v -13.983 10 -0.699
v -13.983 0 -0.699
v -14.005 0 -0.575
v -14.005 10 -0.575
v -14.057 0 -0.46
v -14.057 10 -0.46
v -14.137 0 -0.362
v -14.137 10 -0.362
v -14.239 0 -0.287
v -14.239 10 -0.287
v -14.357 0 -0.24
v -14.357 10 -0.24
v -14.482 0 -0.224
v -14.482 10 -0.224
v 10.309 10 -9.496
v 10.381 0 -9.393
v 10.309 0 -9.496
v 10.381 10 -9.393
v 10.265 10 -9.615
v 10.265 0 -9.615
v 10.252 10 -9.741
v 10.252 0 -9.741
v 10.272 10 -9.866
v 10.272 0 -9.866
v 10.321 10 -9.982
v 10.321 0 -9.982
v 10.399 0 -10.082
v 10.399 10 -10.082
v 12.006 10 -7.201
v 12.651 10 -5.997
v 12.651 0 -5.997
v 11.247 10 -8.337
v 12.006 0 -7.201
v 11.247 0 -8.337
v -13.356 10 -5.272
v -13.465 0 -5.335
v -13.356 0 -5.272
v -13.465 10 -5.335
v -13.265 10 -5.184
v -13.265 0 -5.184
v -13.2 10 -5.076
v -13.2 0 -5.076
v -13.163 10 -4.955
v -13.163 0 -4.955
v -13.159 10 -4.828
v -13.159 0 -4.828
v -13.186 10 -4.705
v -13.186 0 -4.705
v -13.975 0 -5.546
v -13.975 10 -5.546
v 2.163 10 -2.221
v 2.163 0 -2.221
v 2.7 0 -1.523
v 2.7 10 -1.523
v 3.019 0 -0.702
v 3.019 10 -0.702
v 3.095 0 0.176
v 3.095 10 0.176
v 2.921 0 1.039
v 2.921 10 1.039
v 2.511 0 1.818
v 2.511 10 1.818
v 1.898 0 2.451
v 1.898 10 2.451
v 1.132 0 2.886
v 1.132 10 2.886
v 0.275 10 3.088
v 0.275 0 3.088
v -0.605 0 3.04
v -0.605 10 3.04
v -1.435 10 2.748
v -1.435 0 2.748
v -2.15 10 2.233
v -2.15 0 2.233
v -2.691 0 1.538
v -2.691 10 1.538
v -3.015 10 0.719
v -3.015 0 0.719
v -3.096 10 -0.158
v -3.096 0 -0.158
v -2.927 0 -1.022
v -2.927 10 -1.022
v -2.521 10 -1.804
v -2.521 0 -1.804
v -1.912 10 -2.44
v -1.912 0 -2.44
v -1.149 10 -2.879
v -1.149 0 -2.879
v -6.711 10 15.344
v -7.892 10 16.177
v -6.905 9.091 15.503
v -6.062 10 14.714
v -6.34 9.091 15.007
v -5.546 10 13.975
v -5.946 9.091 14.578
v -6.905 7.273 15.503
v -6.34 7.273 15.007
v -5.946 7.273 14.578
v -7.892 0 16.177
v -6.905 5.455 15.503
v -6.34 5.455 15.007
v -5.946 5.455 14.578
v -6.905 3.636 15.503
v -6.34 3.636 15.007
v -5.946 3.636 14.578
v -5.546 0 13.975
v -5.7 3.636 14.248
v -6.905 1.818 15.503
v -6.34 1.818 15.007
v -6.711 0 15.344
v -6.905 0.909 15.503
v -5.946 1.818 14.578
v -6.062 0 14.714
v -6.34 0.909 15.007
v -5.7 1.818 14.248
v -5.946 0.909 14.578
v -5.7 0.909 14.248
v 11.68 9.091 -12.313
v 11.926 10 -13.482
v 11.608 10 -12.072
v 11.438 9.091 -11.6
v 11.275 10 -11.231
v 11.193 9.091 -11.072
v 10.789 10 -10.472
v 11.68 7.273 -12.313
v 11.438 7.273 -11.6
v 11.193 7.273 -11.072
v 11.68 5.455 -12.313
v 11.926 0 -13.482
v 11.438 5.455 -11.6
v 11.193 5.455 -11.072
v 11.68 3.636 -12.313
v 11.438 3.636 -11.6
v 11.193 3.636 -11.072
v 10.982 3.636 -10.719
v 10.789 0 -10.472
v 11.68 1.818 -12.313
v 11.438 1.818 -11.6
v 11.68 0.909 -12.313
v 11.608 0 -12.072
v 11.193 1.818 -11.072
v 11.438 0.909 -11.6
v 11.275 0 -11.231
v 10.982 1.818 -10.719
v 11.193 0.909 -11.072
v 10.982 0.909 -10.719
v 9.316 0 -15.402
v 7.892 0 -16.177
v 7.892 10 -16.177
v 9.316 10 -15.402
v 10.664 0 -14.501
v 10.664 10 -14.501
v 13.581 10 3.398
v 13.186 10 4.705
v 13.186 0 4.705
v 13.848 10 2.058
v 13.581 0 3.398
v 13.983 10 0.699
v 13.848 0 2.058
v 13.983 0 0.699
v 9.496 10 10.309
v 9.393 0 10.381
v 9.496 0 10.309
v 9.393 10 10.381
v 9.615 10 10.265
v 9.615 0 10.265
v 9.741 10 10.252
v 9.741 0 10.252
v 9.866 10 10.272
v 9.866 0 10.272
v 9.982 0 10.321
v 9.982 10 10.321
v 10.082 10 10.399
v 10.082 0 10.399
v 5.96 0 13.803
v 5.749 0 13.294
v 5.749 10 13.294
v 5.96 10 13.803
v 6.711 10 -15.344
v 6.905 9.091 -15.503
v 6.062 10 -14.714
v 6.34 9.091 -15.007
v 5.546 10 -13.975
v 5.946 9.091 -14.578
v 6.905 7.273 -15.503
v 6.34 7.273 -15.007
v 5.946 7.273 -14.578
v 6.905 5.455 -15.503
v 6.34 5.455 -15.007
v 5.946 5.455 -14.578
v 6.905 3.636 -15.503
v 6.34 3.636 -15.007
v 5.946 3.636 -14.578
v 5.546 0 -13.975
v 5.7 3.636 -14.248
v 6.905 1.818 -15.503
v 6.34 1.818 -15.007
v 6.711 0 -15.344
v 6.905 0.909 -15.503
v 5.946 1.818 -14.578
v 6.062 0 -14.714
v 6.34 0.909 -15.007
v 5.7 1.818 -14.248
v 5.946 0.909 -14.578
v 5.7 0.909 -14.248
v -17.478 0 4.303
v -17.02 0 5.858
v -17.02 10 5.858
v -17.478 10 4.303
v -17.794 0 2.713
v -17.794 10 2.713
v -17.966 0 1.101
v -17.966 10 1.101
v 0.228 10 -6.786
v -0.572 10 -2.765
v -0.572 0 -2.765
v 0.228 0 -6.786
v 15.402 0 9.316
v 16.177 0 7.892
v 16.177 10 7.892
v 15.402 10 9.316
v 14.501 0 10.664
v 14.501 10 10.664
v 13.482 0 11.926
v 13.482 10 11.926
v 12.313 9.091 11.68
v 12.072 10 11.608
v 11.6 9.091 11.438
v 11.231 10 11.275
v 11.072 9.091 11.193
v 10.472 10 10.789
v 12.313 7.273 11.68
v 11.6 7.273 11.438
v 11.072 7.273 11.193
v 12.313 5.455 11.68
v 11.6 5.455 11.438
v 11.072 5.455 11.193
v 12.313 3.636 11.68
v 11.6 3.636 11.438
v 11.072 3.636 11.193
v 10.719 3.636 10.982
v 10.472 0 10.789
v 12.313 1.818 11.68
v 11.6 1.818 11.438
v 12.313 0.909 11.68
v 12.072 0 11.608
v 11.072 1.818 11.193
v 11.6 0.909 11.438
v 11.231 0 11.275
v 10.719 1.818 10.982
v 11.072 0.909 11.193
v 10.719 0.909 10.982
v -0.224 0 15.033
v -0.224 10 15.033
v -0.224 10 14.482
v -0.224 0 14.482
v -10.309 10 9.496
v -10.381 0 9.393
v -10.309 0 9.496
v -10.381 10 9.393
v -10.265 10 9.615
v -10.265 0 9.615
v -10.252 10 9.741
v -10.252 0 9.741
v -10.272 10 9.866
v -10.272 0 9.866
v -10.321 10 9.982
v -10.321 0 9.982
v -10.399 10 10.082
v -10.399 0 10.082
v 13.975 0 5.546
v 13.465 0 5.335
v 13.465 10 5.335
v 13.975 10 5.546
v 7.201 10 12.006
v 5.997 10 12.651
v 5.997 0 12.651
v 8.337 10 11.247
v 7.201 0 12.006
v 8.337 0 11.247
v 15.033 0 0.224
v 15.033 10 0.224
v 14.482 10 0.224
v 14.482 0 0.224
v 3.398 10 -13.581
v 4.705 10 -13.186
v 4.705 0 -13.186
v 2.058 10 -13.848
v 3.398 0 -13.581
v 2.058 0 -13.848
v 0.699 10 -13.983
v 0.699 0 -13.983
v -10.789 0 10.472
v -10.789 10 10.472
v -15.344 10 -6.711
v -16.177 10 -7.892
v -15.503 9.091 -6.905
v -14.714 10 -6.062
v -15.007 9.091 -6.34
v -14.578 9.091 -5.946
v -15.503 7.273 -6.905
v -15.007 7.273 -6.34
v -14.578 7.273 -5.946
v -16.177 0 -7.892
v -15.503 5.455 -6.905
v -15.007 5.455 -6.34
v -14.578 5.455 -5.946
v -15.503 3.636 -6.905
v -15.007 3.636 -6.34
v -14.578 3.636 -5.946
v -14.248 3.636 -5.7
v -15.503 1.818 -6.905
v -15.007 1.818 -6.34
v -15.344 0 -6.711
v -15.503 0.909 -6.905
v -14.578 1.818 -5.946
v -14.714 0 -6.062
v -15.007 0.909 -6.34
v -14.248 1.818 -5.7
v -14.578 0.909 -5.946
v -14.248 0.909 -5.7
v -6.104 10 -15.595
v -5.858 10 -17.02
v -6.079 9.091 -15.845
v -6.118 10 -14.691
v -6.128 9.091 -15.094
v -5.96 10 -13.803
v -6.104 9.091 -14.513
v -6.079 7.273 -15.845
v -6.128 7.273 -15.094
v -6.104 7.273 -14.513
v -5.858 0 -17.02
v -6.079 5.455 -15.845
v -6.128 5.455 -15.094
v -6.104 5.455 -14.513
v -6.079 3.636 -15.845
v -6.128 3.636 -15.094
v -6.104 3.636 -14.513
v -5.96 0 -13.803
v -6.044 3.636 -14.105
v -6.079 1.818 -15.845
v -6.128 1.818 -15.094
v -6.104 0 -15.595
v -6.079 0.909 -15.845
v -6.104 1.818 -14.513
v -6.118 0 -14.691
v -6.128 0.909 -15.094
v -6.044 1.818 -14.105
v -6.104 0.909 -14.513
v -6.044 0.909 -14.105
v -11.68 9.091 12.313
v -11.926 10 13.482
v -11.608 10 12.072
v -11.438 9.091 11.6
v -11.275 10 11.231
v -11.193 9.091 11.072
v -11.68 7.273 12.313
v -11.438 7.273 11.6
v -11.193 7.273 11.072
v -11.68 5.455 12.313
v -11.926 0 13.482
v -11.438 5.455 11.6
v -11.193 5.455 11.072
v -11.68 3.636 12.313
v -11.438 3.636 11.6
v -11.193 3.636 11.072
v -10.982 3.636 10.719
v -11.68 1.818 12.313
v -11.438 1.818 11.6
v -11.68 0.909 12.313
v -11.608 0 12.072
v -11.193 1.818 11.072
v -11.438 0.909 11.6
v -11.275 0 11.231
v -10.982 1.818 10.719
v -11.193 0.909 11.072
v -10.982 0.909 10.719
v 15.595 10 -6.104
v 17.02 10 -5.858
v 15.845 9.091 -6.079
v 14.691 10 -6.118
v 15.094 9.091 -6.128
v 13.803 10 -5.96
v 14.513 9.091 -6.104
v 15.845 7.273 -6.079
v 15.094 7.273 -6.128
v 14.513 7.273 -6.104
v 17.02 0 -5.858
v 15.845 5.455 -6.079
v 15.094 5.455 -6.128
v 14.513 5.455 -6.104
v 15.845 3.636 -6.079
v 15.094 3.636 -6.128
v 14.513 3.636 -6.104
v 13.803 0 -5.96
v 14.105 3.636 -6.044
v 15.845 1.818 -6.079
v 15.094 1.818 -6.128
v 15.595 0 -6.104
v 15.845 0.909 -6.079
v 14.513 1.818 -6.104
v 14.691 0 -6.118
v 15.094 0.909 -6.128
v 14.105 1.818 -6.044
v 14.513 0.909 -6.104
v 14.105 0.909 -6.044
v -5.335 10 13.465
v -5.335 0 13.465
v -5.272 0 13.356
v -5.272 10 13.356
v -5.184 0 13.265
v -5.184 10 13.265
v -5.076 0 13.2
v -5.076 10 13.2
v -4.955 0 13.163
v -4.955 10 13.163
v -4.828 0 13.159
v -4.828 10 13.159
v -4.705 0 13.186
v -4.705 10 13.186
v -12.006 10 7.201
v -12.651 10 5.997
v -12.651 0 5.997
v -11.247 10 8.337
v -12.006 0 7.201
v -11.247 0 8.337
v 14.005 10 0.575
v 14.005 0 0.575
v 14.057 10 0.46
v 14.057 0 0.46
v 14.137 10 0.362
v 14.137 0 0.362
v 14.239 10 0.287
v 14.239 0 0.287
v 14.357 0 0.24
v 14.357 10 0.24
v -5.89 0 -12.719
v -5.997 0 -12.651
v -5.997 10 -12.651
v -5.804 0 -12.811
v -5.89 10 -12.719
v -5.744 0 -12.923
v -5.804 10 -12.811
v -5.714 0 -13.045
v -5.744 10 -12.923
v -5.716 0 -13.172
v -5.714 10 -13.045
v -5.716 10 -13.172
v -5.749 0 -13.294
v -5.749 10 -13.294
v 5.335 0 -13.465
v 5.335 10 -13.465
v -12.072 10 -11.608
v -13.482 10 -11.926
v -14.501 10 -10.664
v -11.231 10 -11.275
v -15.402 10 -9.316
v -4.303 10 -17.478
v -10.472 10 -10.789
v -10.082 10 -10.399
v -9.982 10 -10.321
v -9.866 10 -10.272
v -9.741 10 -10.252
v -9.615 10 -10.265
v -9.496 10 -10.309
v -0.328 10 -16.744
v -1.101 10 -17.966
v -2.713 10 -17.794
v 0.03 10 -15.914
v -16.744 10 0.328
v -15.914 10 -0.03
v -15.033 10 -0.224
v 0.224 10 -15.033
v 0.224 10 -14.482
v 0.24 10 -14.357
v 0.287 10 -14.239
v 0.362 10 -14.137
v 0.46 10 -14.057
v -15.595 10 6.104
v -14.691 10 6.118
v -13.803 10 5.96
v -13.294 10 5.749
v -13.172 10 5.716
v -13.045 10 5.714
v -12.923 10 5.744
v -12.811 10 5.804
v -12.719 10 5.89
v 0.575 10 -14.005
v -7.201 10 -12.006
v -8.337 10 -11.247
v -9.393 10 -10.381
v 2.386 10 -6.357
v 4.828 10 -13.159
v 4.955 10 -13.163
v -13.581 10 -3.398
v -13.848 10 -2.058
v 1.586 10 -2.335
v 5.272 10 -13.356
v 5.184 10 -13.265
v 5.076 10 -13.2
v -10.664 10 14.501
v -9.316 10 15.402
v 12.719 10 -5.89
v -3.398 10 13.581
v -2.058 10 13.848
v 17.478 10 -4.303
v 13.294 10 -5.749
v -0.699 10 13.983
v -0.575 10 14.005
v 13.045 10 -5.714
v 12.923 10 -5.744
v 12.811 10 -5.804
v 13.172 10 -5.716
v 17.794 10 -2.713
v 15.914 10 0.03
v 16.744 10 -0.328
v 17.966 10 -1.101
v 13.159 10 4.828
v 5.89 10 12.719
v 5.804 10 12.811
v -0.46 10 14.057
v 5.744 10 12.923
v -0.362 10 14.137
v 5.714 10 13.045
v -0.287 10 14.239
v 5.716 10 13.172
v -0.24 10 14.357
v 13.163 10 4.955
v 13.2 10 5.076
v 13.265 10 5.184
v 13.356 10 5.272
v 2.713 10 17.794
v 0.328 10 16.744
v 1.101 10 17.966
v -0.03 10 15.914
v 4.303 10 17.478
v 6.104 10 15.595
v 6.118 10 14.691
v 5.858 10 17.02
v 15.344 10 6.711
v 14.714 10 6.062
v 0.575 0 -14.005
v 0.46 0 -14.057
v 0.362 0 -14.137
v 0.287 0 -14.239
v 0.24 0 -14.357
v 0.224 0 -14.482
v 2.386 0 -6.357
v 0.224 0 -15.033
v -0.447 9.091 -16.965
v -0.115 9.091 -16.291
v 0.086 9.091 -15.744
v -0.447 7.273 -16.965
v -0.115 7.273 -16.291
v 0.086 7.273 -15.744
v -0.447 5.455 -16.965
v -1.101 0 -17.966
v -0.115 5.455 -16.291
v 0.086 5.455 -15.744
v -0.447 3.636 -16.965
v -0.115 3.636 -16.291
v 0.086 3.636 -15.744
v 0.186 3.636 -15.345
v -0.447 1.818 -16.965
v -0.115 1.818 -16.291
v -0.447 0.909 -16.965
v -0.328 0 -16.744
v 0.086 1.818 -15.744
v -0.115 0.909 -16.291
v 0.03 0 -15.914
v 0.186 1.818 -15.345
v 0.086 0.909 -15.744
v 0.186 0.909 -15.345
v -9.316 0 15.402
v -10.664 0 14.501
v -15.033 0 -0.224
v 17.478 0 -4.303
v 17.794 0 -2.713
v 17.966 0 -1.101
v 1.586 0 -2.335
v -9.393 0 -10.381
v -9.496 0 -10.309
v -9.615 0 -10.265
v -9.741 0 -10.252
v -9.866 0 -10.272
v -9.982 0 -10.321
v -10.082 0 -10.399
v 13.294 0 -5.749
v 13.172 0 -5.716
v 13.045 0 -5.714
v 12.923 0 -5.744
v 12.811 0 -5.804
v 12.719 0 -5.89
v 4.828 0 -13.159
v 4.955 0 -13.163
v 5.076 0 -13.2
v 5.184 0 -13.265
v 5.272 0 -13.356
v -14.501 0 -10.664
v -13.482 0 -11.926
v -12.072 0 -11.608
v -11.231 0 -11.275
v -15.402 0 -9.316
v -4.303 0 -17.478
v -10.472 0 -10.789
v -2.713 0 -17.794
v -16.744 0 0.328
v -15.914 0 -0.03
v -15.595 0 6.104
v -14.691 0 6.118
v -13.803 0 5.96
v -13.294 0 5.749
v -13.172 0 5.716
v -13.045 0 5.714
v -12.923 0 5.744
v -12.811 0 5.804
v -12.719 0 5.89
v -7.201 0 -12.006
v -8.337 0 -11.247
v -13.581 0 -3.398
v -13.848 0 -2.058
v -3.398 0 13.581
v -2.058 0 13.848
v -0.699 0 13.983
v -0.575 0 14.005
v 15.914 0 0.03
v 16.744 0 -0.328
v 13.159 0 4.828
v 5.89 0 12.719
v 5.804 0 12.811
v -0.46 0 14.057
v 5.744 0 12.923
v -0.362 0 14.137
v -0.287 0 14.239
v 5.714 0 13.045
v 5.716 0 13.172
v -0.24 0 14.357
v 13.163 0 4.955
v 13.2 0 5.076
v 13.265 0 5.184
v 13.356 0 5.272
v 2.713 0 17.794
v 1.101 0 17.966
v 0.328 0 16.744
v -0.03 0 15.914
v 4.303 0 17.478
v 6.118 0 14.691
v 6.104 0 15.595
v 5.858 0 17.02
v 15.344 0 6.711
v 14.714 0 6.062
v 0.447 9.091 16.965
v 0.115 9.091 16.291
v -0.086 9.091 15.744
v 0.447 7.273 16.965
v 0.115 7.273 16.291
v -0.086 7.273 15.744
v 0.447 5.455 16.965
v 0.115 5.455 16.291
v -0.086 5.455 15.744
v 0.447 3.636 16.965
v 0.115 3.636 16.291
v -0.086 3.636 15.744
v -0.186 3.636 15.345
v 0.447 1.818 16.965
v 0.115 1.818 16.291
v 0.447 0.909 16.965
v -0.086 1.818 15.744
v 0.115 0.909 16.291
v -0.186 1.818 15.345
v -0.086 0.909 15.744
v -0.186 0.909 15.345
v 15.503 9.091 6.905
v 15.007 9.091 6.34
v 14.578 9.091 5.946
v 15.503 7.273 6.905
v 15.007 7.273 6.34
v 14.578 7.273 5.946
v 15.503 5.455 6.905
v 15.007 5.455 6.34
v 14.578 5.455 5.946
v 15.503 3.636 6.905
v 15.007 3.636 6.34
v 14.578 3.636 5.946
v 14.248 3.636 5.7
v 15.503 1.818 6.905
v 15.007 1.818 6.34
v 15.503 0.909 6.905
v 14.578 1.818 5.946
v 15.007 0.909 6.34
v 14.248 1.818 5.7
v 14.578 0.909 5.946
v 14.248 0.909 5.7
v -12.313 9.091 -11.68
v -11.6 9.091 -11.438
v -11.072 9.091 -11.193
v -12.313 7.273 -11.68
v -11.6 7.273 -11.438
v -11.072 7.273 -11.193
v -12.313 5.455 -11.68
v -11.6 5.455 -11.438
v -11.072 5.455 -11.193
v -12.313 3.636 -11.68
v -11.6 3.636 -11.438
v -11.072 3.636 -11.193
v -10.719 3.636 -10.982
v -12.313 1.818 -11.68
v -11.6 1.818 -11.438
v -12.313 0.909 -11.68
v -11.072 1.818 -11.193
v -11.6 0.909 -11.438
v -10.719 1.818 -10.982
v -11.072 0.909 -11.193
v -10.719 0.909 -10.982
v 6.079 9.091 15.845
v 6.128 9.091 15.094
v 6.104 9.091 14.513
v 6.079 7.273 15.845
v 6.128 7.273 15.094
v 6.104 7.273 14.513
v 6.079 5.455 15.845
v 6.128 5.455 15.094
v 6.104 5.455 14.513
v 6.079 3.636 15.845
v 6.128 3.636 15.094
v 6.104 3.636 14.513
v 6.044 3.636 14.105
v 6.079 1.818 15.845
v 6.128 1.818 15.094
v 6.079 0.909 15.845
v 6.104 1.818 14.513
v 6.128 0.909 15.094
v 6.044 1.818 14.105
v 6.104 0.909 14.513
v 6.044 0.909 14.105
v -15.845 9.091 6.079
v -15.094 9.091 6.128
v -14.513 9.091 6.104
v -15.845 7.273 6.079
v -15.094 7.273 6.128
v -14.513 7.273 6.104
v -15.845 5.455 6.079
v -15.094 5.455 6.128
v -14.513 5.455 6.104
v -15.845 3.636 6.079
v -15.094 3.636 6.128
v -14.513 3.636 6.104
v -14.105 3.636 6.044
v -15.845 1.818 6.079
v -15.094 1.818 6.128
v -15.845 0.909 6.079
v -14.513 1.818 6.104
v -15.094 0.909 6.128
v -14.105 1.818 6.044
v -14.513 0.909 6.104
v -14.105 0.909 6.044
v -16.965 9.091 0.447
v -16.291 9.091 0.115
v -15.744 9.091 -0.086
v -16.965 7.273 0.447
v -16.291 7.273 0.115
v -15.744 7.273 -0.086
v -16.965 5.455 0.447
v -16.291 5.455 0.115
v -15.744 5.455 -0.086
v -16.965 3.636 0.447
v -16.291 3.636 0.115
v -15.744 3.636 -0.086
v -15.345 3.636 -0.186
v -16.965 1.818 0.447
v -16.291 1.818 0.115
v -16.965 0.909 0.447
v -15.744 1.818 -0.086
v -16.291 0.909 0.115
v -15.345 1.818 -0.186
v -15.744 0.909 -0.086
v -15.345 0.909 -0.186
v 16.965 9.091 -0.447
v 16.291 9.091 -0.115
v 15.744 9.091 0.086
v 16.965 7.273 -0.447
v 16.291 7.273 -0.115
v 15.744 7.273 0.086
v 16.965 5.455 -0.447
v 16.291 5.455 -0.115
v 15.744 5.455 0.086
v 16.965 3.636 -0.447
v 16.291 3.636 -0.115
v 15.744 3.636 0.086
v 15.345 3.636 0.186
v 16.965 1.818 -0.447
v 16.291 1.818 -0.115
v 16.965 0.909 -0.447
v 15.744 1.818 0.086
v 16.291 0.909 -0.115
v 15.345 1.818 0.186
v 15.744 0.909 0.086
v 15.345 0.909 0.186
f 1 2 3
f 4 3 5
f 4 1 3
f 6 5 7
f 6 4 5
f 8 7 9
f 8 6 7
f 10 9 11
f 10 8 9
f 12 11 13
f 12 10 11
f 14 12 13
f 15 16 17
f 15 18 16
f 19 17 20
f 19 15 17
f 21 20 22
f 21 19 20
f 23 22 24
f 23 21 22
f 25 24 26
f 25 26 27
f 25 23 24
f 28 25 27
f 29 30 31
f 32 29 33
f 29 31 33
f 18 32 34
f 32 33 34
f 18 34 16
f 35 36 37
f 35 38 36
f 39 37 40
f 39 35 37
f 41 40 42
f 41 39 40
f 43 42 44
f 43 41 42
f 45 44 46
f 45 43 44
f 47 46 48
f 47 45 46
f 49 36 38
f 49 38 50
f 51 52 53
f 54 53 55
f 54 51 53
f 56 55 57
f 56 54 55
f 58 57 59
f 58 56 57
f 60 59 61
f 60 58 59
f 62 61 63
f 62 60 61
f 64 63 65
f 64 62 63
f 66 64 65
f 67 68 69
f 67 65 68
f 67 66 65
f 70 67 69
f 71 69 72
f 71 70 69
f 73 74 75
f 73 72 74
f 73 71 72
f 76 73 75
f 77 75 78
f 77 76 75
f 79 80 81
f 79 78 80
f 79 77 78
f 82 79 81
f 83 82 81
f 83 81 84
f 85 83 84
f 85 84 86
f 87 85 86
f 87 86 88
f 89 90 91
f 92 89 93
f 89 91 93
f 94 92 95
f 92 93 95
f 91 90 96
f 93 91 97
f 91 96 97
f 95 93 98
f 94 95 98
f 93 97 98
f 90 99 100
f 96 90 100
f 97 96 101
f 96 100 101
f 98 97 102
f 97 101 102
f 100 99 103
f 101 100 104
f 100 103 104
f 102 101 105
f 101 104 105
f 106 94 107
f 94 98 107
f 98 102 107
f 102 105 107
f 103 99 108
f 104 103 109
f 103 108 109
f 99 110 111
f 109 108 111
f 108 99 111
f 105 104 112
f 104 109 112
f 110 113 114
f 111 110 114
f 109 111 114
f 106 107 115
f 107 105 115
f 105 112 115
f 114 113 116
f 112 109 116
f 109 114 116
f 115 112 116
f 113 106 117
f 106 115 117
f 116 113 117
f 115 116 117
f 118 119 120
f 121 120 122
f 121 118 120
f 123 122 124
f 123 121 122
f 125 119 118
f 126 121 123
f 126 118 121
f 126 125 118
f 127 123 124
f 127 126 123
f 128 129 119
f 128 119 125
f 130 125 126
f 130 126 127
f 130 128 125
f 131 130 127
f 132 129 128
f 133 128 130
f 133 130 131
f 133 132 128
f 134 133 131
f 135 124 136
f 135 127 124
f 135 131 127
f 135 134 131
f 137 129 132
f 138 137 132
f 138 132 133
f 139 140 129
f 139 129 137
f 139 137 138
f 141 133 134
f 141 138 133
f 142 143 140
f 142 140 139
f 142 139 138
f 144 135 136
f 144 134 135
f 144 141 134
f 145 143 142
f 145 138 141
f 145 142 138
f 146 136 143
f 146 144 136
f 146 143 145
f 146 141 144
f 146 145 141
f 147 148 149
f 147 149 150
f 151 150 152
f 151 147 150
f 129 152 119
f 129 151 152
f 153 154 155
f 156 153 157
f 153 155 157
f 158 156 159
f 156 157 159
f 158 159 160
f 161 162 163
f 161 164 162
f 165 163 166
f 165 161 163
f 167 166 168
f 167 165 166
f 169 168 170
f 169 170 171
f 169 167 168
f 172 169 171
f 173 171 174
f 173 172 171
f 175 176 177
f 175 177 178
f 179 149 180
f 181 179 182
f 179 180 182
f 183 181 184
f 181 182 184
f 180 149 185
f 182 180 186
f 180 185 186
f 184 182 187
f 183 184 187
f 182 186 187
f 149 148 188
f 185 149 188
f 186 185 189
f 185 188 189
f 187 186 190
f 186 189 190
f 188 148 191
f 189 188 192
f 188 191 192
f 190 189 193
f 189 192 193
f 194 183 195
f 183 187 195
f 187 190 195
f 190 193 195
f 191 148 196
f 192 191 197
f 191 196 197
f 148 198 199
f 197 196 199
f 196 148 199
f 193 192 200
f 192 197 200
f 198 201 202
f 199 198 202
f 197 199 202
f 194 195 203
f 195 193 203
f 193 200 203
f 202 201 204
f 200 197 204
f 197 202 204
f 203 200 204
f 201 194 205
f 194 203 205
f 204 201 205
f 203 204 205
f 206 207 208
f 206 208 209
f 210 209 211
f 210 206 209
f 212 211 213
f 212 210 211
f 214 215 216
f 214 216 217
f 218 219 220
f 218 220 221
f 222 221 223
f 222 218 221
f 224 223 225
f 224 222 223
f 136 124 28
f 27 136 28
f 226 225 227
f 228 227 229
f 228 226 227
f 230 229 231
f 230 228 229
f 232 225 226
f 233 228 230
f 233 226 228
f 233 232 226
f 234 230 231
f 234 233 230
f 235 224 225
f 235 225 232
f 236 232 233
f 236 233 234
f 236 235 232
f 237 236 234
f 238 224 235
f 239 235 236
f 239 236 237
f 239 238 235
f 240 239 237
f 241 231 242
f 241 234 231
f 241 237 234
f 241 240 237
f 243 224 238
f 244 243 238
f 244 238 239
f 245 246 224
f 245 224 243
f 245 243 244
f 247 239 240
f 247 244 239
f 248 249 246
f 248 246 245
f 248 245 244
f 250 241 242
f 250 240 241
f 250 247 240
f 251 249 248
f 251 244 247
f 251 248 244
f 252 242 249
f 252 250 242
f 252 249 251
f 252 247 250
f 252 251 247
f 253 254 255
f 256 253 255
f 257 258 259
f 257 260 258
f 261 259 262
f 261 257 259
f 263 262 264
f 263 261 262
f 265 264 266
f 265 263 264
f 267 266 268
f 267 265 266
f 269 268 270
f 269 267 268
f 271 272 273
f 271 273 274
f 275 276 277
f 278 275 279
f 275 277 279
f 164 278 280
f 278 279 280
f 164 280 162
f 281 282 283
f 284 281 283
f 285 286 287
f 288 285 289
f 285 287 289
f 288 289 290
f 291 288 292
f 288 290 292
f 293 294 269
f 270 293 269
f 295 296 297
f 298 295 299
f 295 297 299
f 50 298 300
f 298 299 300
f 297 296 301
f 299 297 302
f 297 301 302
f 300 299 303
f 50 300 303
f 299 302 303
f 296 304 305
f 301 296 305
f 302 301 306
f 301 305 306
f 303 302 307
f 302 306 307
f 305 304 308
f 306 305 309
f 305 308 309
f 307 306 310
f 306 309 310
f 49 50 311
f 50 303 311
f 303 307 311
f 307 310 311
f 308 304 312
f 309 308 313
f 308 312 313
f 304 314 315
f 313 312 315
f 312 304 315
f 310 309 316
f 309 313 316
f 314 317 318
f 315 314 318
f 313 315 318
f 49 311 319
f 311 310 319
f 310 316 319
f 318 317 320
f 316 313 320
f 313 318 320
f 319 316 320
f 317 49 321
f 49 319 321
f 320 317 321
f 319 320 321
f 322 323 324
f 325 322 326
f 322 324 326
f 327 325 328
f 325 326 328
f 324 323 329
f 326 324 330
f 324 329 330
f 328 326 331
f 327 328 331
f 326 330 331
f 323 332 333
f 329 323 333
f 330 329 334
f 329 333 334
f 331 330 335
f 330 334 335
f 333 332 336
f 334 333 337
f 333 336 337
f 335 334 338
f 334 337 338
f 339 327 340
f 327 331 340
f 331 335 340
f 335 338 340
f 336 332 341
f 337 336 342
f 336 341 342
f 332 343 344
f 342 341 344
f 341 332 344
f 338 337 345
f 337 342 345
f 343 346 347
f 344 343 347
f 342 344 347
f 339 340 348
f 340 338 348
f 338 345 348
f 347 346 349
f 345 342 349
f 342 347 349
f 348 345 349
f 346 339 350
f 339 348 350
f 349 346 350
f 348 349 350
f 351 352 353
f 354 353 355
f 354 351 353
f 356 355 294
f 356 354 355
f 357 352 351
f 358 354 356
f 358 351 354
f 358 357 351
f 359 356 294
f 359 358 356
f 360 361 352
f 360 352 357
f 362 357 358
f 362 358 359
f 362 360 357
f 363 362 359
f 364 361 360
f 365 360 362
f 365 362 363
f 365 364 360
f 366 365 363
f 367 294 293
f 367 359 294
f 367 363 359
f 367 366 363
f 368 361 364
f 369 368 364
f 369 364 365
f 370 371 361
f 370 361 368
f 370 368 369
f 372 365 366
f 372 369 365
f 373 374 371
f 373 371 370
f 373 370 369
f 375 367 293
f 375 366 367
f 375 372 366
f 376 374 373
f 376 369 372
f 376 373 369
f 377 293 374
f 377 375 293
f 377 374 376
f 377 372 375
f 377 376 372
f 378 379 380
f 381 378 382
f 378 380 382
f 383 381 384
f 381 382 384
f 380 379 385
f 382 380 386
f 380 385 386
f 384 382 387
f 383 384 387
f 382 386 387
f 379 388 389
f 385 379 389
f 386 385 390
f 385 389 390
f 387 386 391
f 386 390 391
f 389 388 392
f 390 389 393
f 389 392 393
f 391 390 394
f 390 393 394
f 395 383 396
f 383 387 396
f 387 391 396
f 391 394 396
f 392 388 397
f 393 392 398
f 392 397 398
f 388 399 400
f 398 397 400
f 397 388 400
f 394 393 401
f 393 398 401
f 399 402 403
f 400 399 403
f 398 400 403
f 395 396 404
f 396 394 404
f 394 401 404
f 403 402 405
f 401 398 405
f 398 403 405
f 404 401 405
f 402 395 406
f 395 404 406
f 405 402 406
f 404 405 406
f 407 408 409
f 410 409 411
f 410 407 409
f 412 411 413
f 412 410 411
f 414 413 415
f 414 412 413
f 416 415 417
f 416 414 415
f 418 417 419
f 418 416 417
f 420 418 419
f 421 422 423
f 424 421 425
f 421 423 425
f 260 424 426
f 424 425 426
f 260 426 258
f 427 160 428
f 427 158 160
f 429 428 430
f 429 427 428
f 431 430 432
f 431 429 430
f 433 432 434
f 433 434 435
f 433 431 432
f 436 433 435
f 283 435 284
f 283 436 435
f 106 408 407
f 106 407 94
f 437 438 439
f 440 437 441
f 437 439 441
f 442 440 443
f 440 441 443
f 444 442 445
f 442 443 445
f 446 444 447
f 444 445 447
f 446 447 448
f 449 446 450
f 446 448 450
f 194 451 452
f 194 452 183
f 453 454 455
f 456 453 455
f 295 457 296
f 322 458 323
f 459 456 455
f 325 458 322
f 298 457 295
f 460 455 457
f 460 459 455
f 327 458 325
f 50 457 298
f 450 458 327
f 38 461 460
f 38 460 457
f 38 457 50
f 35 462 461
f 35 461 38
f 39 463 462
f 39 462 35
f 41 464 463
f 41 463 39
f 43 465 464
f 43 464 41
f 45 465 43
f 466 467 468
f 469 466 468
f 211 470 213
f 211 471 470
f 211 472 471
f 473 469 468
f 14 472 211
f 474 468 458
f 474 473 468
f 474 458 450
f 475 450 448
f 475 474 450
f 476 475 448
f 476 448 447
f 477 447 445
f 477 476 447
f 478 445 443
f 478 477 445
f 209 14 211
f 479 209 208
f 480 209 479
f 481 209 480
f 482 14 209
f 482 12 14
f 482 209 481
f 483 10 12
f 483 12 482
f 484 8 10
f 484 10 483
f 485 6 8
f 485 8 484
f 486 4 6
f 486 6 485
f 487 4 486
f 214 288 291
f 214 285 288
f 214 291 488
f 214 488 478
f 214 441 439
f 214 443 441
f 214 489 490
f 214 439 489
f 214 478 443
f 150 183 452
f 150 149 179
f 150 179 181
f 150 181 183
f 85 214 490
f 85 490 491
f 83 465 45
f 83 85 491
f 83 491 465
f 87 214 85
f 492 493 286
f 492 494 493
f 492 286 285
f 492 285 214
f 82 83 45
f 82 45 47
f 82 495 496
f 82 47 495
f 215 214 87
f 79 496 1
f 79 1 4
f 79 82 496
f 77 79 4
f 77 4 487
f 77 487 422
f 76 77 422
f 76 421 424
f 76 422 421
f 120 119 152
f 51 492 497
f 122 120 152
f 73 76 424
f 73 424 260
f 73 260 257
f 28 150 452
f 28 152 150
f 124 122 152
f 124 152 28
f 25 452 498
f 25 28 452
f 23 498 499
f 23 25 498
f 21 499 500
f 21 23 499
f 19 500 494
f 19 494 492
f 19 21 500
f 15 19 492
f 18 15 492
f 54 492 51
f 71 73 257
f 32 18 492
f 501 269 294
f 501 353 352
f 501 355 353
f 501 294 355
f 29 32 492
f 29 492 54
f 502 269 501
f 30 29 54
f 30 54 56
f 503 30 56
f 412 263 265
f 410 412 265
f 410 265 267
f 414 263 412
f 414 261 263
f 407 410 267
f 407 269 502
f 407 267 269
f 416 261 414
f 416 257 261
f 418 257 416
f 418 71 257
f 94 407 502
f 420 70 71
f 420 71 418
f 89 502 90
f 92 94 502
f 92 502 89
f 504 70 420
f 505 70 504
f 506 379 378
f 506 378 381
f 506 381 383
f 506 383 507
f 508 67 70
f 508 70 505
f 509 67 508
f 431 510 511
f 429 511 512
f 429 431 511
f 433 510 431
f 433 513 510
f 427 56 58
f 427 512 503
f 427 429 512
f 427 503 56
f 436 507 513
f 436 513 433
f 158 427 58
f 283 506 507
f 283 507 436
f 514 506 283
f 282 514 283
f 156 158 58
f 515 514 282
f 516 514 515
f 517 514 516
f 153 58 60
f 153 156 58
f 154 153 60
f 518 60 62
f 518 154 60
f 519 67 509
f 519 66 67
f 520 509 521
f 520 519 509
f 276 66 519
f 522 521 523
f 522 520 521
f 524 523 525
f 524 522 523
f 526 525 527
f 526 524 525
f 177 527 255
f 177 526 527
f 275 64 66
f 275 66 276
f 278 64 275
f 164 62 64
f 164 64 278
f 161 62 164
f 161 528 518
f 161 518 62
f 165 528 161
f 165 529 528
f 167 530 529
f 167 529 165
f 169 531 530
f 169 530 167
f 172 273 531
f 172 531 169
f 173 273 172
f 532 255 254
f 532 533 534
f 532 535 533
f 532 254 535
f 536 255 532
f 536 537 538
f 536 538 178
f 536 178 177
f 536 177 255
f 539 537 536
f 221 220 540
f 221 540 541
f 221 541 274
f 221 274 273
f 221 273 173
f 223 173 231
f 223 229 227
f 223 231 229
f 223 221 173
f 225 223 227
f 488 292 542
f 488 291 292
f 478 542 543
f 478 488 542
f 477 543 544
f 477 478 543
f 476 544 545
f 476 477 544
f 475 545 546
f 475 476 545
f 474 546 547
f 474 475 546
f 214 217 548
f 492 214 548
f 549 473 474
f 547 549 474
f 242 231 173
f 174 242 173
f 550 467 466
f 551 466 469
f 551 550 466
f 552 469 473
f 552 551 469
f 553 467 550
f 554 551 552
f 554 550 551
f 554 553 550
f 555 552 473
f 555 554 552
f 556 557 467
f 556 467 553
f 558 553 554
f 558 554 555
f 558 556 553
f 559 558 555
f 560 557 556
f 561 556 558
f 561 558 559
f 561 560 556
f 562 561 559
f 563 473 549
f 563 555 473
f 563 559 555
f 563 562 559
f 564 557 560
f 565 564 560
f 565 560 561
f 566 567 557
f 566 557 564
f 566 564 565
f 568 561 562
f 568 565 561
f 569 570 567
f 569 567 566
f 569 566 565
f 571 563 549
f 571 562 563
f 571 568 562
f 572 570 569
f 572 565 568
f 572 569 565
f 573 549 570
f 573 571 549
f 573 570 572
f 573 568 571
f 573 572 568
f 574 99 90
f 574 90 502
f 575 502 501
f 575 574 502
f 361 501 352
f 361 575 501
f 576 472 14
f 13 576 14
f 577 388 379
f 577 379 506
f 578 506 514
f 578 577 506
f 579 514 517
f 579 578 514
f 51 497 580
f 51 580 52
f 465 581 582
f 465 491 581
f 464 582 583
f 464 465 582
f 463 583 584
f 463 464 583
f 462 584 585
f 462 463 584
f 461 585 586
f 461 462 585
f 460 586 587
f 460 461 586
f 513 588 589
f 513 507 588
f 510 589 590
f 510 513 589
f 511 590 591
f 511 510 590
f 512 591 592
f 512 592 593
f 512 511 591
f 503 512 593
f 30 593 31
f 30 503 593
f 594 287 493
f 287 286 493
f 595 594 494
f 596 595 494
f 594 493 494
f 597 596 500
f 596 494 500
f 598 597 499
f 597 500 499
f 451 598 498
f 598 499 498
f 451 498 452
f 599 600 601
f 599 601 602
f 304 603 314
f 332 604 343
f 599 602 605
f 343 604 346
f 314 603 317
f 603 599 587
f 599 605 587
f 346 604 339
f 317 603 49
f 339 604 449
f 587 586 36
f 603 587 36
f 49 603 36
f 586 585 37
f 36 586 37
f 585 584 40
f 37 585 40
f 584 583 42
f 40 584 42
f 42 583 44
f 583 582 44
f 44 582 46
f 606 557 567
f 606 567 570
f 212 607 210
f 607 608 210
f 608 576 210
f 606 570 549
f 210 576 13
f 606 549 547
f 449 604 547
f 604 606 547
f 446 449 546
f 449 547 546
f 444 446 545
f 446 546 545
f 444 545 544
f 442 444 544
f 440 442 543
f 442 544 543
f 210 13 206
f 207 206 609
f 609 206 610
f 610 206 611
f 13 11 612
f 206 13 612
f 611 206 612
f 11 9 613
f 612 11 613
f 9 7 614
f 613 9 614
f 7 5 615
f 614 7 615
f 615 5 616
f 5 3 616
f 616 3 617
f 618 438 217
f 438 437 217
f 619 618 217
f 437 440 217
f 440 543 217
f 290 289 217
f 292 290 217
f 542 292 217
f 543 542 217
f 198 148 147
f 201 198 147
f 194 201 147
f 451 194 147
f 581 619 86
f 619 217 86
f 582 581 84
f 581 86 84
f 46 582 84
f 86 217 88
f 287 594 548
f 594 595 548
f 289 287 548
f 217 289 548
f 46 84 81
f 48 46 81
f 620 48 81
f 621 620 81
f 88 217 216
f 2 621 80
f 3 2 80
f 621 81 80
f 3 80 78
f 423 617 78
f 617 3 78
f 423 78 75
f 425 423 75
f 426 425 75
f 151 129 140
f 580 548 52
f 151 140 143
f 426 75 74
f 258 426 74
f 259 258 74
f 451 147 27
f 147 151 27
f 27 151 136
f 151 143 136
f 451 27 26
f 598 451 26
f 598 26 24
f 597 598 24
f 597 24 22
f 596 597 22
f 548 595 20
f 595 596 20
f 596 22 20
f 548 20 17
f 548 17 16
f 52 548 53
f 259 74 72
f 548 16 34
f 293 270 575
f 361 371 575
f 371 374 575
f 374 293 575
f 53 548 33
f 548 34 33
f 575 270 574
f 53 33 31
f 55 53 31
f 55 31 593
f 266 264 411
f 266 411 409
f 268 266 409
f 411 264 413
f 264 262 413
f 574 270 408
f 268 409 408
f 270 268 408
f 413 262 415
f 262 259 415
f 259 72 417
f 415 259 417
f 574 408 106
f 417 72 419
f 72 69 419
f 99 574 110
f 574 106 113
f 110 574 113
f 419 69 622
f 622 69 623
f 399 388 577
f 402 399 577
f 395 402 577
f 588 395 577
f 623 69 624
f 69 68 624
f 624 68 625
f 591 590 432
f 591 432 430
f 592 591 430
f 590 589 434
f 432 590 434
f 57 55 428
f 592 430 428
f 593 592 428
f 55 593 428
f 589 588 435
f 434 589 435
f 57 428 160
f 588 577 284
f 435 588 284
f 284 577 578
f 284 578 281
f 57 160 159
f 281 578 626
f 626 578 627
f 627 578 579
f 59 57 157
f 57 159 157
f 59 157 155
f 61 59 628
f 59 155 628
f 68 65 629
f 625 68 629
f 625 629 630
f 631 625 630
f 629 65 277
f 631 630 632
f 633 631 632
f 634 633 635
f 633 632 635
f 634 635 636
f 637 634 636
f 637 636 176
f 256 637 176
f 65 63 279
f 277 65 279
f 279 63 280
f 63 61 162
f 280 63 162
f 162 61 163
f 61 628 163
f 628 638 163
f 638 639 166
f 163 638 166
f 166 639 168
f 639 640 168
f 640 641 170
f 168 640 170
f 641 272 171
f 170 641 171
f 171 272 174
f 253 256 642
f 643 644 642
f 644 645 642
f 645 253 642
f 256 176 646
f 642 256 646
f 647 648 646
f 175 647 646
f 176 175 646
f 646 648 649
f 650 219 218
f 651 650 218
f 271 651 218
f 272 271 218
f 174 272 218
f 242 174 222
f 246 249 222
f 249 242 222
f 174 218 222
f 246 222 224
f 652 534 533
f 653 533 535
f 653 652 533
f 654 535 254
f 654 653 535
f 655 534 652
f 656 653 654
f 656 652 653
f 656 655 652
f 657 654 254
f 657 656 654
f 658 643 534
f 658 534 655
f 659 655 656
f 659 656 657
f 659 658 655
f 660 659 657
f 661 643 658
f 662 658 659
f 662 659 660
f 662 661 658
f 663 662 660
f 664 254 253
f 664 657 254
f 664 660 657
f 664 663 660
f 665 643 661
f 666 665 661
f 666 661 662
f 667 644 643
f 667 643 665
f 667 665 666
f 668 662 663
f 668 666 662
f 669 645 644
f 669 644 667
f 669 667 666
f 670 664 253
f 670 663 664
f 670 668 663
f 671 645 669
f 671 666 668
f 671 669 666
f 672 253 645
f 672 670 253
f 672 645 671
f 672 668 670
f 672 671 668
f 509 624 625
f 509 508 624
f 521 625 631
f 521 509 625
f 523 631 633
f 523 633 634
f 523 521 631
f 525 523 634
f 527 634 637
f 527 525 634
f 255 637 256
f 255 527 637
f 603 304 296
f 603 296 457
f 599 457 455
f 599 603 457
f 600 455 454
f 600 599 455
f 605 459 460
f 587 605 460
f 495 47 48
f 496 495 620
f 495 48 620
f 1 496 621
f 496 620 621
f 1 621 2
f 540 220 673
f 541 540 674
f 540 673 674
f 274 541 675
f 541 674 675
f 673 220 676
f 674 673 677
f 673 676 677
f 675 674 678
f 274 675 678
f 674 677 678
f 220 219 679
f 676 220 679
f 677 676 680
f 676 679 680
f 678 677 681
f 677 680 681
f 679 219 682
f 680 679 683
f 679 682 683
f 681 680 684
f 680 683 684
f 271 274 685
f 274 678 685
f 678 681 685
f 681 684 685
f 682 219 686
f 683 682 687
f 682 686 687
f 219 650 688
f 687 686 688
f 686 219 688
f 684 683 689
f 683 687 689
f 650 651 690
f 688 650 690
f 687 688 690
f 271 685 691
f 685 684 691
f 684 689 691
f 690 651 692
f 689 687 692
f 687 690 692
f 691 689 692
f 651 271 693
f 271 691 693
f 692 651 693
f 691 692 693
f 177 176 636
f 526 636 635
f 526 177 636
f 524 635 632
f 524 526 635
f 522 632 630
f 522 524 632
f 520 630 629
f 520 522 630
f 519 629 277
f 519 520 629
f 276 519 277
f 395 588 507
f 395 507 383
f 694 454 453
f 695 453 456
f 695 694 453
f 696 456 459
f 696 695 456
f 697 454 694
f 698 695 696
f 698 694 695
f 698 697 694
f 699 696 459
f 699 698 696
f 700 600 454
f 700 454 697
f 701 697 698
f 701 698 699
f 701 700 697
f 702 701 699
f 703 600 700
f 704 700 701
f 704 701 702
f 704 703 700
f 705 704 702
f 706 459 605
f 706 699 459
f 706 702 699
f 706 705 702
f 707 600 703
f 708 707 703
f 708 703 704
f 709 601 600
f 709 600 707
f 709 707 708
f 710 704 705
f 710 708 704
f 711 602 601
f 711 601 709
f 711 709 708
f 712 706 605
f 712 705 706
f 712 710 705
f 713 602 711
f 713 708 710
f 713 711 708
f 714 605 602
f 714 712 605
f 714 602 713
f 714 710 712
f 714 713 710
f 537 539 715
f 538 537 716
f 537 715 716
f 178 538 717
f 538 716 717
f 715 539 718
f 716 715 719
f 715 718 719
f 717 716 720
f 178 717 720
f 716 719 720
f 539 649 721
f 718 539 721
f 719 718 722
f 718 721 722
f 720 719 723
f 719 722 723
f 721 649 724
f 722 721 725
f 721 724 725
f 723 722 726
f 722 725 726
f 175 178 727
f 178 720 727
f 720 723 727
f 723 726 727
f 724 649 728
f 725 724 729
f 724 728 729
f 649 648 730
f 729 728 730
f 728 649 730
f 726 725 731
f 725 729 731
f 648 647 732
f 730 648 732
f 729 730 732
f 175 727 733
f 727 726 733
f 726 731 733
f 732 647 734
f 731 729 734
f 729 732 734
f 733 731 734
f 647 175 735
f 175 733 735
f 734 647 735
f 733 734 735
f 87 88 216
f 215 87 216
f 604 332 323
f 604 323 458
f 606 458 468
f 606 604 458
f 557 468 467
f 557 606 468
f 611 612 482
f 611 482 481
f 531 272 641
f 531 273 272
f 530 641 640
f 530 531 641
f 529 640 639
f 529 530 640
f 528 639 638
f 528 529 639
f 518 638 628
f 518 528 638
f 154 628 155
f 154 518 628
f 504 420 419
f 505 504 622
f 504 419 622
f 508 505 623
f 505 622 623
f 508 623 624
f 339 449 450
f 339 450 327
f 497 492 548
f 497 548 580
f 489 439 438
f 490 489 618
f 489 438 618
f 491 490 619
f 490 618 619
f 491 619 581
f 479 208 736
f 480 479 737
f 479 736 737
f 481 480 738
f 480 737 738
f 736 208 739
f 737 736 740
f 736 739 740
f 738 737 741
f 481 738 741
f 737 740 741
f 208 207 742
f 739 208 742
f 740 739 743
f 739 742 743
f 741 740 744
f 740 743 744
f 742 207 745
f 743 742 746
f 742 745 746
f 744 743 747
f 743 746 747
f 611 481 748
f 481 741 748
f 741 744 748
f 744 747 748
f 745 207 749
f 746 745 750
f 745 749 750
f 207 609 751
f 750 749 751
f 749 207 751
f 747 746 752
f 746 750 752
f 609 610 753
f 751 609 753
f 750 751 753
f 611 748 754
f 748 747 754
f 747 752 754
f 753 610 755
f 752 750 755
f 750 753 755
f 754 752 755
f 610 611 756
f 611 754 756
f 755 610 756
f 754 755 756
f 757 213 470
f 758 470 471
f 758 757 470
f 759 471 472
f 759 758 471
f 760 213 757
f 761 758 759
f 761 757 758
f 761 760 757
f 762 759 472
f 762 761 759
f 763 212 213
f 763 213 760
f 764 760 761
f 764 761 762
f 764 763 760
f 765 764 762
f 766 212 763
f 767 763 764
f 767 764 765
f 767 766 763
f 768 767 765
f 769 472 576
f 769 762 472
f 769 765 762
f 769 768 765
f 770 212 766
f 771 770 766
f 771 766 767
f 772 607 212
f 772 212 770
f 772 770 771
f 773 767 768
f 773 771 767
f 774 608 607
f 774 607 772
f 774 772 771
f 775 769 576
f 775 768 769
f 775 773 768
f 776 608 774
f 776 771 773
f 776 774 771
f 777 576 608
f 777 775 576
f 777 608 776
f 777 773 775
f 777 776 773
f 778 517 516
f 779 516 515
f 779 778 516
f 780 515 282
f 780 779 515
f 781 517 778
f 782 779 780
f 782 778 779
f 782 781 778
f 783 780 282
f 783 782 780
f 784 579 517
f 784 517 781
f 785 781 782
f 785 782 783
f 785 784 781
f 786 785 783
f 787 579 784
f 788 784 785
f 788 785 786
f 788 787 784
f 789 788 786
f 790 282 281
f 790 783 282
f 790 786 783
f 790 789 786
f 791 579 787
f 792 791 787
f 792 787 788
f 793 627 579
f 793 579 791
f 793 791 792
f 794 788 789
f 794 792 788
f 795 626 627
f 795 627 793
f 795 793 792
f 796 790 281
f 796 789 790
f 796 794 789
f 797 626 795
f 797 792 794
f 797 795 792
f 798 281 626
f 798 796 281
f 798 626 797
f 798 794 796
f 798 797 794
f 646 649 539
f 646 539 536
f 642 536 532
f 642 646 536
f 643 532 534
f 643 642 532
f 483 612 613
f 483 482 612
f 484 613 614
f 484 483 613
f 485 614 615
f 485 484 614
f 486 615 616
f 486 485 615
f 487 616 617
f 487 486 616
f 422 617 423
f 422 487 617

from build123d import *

# Parameters (mm, degrees)
SKETCH_4_R                       = 14
EXTRUDE_1_DEPTH                  = 10
EXTRUDE_2_DEPTH                  = 10
FILLET_1_R                       = 0.5
PATTERN_CIRCULAR_1_COUNT         = 8
FILLET_1_OF_PATTERN_CIRCULAR_1_R = 0.5
CUT_EXTRUDE_1_DEPTH              = 28.30524858


with BuildPart() as part:
    # Sketch 4 → Extrude 1 (new body)
    with BuildSketch(Plane(origin=(0, 0, 0), x_dir=(1, 0, 0), z_dir=(0, 1, 0))):
        with Locations(Location((0, 0, 0), (0, 0, 270))):
            Circle(SKETCH_4_R)
    extrude(amount=EXTRUDE_1_DEPTH)

    # Sketch 3 → Extrude 2 (add)
    with BuildSketch(Plane(origin=(0, 0, 0), x_dir=(1, 0, 0), z_dir=(0, 1, 0))):
        with BuildLine():
            Line((0.224080336, 15.033412012), (0.224080336, 13.9982066))
            ThreePointArc((0.224080336, 13.9982066), (-2.731264508, 13.730993926), (-5.563904985, 12.846904737))
            Line((-5.563904985, 12.846904737), (-5.960060945, 13.80330983))
            add(Edge.make_bspline(
                [(-5.858426114, 17.019954273), (-5.920939237, 16.775820636), (-6.005177259, 16.385669184), (-6.081389407, 15.859669081), (-6.117456435, 15.463573167), (-6.130866377, 15.108674888), (-6.126107546, 14.796141282), (-6.107718221, 14.526781883), (-6.080279115, 14.301036558), (-6.048330179, 14.119000945), (-6.01650055, 13.980359087), (-5.987708331, 13.879742422), (-5.969195203, 13.825538164), (-5.960060945, 13.80330983)],
                knots=[0, 0, 0, 0, 0.232146242, 0.367277189, 0.48933989, 0.598334347, 0.694260559, 0.777118527, 0.846908252, 0.903629737, 0.947282983, 0.977868, 1, 1, 1, 1], degree=3))
            ThreePointArc((-5.858426114, 17.019954273), (-3.511625796, 17.654135047), (-1.10077454, 17.966310011))
            add(Edge.make_bspline(
                [(-1.10077454, 17.966310011), (-0.949594047, 17.764682676), (-0.722463767, 17.436466231), (-0.450761398, 16.979670628), (-0.265860465, 16.627527975), (-0.117657603, 16.304776481), (-0.002452756, 16.014211953), (0.083637102, 15.758319028), (0.14467567, 15.539257051), (0.184820715, 15.358851746), (0.208469915, 15.218582699), (0.220373703, 15.114606716), (0.224012874, 15.057443845), (0.224080336, 15.033412012)],
                knots=[0, 0, 0, 0, 0.232146242, 0.367277189, 0.48933989, 0.598334347, 0.694260559, 0.777118527, 0.846908252, 0.903629737, 0.947282983, 0.977868, 1, 1, 1, 1], degree=3))
        make_face()
    extrude_2 = extrude(amount=EXTRUDE_2_DEPTH)

    # Fillet 1
    fillet_1_edges = [part.edges().sort_by_distance(p)[0] for p in [
        (-5.563904985, 5, -12.846904737),
        (0.224080336, 5, -13.9982066),
    ]]
    fillet(fillet_1_edges, radius=FILLET_1_R)

    # Pattern Circular 1: Extrude 2 ×8 about axis
    pattern_circular_1_axis = Axis((0, 10, 0), (0, 1, 0))
    for i in range(1, PATTERN_CIRCULAR_1_COUNT):
        add(extrude_2.rotate(pattern_circular_1_axis, i * 360 / PATTERN_CIRCULAR_1_COUNT))

    # Fillet 1 of Pattern Circular 1
    fillet_1_of_pattern_circular_1_edges = [part.edges().sort_by_distance(p)[0] for p in [
        (-13.018408401, 5, -5.149858512),
        (-9.739778086, 5, -10.056675536),
        (-12.846904737, 5, 5.563904985),
        (-13.9982066, 5, -0.224080336),
        (-5.149858512, 5, 13.018408401),
        (-10.056675536, 5, 9.739778086),
        (5.563904985, 5, 12.846904737),
        (-0.224080336, 5, 13.9982066),
        (13.018408401, 5, 5.149858512),
        (9.739778086, 5, 10.056675536),
        (12.846904737, 5, -5.563904985),
        (13.9982066, 5, 0.224080336),
        (5.149858512, 5, -13.018408401),
        (10.056675536, 5, -9.739778086),
    ]]
    fillet(fillet_1_of_pattern_circular_1_edges, radius=FILLET_1_OF_PATTERN_CIRCULAR_1_R)

    # Sketch 5 → Cut-Extrude 1 (cut, through all)
    with BuildSketch(Plane(origin=(0, 10, 0), x_dir=(1, 0, 0), z_dir=(0, 1, 0))):
        with BuildLine():
            Line((-1.148521284, 2.879392099), (-0.571628971, 2.764641083))
            Line((-0.571628971, 2.764641083), (0.228241349, 6.785860733))
            Line((0.228241349, 6.785860733), (2.385968966, 6.356662024))
            Line((2.385968966, 6.356662024), (1.586098646, 2.335442375))
            Line((1.586098646, 2.335442375), (2.162990959, 2.220691359))
            ThreePointArc((2.162990959, 2.220691359), (-0.604779998, -3.040434369), (-1.148521284, 2.879392099))
        make_face()
    extrude(amount=-CUT_EXTRUDE_1_DEPTH, mode=Mode.SUBTRACT)


solid = part.part
